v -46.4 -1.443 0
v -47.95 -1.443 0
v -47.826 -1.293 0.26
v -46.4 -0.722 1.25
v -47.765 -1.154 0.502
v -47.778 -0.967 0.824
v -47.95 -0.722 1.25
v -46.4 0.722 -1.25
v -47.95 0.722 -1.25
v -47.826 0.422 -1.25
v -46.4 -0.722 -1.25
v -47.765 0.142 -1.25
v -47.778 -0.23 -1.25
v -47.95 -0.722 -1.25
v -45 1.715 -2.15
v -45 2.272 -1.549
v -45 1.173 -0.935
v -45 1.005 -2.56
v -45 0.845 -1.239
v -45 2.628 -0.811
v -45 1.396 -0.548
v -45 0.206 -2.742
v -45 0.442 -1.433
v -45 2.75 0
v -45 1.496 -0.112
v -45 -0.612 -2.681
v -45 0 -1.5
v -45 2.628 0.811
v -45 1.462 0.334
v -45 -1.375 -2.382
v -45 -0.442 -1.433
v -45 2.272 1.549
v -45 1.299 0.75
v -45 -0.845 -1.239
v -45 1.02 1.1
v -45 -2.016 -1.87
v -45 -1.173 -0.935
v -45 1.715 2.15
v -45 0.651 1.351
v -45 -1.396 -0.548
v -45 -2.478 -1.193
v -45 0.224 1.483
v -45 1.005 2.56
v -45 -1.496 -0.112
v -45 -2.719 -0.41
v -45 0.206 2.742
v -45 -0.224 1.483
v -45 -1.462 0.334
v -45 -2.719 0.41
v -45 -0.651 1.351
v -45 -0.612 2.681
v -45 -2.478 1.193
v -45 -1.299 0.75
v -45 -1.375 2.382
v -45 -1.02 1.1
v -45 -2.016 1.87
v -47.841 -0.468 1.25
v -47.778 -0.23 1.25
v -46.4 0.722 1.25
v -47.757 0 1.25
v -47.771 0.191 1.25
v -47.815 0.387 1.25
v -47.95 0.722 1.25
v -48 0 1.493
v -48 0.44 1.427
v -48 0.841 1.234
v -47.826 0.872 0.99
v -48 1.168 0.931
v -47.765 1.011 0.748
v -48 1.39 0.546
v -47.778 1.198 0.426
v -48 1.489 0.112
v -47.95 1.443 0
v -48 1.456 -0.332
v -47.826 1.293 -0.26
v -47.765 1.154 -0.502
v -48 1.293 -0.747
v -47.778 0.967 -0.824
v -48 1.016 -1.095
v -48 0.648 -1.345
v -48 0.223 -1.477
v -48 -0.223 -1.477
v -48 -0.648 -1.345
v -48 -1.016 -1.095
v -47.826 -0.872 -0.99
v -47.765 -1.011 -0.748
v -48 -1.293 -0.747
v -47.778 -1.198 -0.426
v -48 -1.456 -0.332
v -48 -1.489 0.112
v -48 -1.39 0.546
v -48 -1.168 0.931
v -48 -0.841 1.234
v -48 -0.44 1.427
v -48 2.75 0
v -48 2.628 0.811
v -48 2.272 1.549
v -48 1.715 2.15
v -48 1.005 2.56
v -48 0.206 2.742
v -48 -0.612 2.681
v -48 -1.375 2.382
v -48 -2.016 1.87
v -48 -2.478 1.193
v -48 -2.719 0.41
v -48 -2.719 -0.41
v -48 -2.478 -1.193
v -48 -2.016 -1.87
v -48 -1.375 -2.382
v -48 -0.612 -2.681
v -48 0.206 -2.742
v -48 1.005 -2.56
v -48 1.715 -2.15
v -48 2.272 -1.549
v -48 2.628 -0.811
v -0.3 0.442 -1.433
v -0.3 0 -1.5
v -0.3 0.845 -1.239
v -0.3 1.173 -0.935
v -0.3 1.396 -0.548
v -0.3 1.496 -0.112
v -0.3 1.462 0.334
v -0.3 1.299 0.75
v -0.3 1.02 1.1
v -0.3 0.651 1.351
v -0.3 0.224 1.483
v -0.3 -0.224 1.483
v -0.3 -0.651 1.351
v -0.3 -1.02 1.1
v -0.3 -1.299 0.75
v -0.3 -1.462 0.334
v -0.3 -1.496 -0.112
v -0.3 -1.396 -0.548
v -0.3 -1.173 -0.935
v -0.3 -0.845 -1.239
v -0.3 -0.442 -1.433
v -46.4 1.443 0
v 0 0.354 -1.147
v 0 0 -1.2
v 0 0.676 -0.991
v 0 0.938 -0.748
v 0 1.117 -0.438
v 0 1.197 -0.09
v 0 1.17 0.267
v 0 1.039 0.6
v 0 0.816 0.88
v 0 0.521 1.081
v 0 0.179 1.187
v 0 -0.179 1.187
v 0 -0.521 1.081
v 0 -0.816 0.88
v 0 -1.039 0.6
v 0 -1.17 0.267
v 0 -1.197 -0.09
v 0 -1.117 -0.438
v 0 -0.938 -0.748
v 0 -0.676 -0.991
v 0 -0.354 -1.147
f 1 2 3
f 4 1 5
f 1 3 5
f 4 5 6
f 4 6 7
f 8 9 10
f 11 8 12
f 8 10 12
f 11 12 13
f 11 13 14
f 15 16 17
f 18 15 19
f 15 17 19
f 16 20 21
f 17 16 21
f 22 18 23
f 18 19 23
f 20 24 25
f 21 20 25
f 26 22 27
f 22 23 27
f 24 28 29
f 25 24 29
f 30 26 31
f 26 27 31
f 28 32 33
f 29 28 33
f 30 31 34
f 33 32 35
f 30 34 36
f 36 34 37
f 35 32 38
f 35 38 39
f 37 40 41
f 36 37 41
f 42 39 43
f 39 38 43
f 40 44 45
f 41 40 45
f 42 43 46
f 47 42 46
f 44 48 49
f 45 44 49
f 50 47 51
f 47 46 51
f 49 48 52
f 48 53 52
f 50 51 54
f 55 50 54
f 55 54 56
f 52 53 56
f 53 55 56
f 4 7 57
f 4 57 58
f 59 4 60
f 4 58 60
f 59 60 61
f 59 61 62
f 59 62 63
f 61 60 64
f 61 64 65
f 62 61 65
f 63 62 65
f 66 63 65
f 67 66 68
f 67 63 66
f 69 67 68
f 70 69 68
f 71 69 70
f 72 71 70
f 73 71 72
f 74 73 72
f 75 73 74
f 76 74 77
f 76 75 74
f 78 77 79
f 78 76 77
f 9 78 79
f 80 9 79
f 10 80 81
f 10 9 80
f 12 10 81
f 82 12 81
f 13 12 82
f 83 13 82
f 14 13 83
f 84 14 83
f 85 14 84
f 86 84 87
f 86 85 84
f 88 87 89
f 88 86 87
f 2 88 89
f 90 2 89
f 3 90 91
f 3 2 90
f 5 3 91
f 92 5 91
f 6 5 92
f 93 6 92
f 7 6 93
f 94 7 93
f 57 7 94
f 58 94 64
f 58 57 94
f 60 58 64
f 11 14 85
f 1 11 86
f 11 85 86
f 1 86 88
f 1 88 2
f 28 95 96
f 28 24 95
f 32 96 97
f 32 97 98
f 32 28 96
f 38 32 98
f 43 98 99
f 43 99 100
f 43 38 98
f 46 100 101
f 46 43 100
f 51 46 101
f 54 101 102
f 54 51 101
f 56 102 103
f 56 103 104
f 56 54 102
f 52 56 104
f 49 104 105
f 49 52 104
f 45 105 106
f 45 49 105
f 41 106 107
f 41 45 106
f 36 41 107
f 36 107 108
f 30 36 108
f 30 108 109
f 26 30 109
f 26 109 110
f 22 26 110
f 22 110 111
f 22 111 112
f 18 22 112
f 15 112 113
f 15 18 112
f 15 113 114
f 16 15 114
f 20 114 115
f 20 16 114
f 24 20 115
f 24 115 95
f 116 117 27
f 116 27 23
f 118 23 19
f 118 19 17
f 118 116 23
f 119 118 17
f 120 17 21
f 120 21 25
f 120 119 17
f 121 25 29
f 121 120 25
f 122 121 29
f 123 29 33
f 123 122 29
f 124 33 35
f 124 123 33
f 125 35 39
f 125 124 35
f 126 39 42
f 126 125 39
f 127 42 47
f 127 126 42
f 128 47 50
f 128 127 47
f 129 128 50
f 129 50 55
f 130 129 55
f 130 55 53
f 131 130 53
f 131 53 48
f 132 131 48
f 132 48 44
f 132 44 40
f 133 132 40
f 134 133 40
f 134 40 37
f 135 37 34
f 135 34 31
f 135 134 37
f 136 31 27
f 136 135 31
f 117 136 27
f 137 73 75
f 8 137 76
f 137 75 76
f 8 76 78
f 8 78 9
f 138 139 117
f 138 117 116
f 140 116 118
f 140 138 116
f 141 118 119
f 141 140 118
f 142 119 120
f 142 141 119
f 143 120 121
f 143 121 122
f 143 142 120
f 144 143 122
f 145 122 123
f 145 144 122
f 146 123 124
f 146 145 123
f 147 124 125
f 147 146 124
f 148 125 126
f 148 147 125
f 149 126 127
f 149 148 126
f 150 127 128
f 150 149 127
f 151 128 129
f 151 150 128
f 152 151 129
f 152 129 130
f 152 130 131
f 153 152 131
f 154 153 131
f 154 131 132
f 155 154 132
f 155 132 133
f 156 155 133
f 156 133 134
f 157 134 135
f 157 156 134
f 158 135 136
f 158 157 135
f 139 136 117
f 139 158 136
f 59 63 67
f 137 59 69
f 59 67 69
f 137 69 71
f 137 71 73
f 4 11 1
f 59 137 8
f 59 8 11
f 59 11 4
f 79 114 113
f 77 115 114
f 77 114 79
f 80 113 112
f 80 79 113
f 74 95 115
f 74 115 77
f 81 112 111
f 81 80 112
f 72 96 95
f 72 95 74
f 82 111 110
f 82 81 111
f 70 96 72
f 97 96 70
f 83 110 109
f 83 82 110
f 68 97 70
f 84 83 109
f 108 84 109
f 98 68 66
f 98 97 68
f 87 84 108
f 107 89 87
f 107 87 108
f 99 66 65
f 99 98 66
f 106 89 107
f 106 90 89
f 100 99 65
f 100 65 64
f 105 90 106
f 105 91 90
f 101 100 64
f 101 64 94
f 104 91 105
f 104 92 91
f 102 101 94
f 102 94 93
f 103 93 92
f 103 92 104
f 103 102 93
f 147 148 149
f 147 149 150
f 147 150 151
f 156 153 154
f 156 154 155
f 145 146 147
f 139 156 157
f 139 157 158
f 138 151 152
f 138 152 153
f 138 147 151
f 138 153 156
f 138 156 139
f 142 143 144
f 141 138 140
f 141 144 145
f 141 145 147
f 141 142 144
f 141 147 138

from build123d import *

# Parameters (mm, degrees)
SKETCH2_R           = 1.5
BOSS_EXTRUDE1_DEPTH = 45
CHAMFER1_SIZE       = 0.3
SKETCH6_W           = 3
SKETCH6_H           = 2.75
CUT_EXTRUDE1_DEPTH  = 1.6
SKETCH8_R           = 1.493375673
CUT_EXTRUDE2_DEPTH  = 1
CUT_EXTRUDE2_TAPER  = 45


with BuildPart() as part:
    # Sketch2 → Boss-Extrude1 (new body)
    with BuildSketch(Plane(origin=(0, 0, 0), x_dir=(0, 0, -1), z_dir=(1, 0, 0))):
        Circle(SKETCH2_R)
    extrude(amount=-BOSS_EXTRUDE1_DEPTH)

    # Chamfer1
    chamfer1_edges = [part.edges().sort_by_distance(p)[0] for p in [
        (0, 0, 1.5),
    ]]
    chamfer(chamfer1_edges, length=CHAMFER1_SIZE)

    # Sketch6 → Revolve1 (revolve)
    with BuildSketch(Plane.XY):
        with Locations((-46.5, 1.375)):
            Rectangle(SKETCH6_W, SKETCH6_H)
    revolve(axis=Axis((-45, 0, 0), (1, 0, 0)))

    # Sketch7 → Cut-Extrude1 (cut)
    with BuildSketch(Plane.ZY.offset(48)):
        Polygon((0, 1.443375673), (-1.25, 0.721687836), (-1.25, -0.721687836), (0, -1.443375673), (1.25, -0.721687836), (1.25, 0.721687836), align=None)
    extrude(amount=-CUT_EXTRUDE1_DEPTH, mode=Mode.SUBTRACT)

    # Sketch8 → Cut-Extrude2 (cut)
    with BuildSketch(Plane.ZY.offset(48)):
        Circle(SKETCH8_R)
    extrude(amount=-CUT_EXTRUDE2_DEPTH, taper=CUT_EXTRUDE2_TAPER, mode=Mode.SUBTRACT)


solid = part.part
